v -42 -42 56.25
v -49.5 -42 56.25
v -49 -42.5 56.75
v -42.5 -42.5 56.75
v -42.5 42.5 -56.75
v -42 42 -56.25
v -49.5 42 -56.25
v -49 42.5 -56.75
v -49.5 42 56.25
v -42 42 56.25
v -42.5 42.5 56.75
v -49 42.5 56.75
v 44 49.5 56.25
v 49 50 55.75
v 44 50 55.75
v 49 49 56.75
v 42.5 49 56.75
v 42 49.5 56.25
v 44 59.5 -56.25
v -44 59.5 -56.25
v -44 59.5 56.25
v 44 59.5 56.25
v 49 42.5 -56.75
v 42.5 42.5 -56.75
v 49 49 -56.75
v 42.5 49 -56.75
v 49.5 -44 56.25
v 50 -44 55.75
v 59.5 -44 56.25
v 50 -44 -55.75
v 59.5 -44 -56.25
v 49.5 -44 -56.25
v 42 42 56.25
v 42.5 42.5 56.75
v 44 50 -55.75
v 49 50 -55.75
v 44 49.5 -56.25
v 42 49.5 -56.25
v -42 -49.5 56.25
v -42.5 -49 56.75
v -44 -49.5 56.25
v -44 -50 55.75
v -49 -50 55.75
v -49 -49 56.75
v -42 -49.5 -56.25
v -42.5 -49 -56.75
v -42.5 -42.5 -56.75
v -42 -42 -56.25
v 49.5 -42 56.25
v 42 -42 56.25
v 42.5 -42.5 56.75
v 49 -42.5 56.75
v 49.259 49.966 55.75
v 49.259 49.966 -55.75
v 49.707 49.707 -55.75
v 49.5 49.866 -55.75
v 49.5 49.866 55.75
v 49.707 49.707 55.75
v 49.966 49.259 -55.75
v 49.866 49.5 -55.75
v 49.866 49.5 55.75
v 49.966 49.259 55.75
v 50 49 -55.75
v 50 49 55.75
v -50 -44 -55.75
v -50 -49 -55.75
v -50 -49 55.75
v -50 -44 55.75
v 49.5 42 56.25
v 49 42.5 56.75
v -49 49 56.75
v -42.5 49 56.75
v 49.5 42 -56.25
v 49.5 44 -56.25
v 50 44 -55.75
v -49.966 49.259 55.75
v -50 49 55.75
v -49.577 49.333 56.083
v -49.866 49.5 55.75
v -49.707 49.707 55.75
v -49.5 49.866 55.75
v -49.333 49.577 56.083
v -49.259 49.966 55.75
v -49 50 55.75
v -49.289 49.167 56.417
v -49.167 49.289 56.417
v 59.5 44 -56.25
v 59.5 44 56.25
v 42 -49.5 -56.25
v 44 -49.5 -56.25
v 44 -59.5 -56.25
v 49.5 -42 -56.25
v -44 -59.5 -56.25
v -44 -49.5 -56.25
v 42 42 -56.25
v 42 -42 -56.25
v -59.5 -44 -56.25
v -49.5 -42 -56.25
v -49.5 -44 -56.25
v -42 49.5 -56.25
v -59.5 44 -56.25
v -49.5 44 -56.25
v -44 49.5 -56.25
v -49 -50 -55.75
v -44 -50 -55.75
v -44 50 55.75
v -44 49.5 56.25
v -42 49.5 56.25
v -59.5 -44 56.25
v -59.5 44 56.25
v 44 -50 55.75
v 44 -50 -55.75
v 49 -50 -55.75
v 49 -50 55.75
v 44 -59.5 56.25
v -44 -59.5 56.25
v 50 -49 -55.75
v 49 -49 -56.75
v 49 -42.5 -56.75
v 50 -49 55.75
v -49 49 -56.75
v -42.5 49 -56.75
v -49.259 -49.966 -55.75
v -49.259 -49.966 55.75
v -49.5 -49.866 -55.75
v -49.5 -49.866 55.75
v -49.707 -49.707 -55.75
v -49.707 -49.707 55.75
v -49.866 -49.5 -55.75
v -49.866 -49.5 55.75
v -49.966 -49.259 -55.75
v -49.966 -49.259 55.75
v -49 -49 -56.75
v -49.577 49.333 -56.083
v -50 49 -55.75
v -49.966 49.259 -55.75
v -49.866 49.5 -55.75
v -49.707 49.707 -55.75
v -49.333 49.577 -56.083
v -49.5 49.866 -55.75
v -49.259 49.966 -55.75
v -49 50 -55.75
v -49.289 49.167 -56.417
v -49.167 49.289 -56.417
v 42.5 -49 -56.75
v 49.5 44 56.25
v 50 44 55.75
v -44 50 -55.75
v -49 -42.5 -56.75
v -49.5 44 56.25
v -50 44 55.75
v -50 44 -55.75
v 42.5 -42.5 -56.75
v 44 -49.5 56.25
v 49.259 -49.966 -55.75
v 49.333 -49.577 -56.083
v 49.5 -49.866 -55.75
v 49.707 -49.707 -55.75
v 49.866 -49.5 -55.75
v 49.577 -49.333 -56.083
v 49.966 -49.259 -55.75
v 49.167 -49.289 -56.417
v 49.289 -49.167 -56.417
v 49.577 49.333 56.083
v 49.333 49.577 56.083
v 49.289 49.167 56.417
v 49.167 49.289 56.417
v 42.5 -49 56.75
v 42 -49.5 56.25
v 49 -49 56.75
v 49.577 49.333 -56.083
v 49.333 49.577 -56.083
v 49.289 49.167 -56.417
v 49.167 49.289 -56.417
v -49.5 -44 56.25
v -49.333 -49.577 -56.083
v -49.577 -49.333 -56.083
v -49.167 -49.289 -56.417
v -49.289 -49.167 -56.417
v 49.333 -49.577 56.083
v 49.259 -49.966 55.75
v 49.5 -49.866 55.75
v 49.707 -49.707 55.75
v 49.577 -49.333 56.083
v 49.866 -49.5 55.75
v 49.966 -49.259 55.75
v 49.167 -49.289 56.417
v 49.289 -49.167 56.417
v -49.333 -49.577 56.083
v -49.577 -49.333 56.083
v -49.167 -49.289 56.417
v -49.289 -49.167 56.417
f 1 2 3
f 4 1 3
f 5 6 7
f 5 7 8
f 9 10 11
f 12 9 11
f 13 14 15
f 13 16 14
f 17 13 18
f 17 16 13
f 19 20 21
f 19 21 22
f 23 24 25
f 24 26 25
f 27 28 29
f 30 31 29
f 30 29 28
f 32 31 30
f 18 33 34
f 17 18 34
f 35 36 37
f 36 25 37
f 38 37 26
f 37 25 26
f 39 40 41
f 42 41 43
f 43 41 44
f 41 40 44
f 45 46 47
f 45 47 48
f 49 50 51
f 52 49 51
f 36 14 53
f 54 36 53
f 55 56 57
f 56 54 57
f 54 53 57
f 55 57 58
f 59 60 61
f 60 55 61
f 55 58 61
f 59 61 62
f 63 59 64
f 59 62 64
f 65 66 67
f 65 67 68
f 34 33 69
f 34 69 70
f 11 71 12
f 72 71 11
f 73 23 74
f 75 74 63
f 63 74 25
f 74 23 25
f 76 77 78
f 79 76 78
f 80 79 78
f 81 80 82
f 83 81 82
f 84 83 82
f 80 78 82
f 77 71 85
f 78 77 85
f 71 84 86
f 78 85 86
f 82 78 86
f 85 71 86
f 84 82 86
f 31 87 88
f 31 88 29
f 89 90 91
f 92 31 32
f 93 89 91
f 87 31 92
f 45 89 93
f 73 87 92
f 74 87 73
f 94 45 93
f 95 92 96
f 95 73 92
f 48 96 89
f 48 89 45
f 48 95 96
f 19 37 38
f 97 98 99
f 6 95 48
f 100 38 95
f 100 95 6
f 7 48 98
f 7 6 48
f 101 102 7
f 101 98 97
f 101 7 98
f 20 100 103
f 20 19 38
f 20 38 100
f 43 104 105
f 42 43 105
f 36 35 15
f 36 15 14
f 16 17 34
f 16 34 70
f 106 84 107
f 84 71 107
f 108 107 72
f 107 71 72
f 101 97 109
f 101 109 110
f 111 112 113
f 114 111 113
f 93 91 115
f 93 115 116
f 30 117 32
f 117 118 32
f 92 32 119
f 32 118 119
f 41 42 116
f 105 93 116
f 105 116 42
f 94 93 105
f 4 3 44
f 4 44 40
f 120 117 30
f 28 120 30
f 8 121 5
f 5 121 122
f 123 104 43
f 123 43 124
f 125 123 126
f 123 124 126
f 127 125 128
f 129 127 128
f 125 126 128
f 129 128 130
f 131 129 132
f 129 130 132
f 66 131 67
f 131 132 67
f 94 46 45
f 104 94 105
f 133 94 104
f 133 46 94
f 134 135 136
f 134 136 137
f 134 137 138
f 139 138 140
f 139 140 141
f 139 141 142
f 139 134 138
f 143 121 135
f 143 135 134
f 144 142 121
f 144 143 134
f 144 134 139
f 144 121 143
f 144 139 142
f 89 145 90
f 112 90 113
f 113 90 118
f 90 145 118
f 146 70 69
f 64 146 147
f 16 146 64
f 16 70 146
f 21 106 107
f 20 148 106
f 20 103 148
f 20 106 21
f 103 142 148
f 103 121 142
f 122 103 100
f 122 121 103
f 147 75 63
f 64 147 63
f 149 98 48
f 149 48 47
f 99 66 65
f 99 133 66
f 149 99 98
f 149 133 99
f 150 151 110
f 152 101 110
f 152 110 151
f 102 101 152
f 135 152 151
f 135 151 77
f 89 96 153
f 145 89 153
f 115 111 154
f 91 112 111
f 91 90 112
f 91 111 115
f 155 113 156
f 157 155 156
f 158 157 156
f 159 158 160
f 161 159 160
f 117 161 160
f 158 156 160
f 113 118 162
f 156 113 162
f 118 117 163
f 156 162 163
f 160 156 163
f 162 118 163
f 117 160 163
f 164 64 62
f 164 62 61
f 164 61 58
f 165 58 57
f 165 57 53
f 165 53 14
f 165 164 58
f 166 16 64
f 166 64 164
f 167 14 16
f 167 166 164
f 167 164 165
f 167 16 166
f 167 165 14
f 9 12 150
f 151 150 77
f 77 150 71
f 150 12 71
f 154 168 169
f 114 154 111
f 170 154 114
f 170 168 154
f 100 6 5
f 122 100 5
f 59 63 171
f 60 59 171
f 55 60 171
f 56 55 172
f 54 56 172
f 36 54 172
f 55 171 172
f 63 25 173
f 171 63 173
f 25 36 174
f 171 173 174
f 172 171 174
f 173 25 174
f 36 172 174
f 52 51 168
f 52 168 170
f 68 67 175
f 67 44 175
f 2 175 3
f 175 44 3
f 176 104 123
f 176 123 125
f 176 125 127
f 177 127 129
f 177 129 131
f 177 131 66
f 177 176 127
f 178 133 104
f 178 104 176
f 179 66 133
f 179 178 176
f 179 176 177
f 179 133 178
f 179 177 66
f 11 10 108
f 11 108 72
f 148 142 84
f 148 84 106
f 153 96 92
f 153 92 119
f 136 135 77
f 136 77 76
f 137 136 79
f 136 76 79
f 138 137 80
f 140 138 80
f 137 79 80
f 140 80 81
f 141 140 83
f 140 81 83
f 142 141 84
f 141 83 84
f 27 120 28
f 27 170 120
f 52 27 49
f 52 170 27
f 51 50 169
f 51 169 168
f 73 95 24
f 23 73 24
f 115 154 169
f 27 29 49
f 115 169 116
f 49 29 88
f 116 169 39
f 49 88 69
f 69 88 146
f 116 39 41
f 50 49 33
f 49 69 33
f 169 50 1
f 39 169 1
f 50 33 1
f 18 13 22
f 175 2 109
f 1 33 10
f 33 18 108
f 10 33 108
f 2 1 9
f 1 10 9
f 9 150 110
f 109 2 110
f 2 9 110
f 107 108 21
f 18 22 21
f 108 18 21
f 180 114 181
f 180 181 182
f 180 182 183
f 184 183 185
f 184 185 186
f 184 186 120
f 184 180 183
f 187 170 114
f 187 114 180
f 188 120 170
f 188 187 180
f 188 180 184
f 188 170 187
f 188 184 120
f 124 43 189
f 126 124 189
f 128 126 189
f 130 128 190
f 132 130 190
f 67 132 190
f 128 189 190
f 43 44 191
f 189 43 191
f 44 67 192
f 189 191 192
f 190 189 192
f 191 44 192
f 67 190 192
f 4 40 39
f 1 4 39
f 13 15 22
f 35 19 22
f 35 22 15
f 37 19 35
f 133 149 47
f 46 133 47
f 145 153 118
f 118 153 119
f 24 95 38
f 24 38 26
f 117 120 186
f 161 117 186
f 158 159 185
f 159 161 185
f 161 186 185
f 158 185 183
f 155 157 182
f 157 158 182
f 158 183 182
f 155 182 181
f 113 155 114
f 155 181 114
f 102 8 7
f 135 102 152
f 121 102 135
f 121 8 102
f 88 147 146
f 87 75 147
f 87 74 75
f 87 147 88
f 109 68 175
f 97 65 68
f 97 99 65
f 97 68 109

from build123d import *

# Parameters (mm, degrees)
BOSS_EXTRUDE1_DEPTH        = 56.75
BOSS_EXTRUDE1_DEPTH_BACK   = 56.75
SKETCH1_W                  = 8.5
SKETCH1_H                  = 8.5
BOSS_EXTRUDE1_2_DEPTH      = 56.75
BOSS_EXTRUDE1_2_DEPTH_BACK = 56.75
BOSS_EXTRUDE1_3_DEPTH      = 56.75
BOSS_EXTRUDE1_3_DEPTH_BACK = 56.75
BOSS_EXTRUDE1_4_DEPTH      = 56.75
BOSS_EXTRUDE1_4_DEPTH_BACK = 56.75
BOSS_EXTRUDE2_DEPTH        = 56.25
BOSS_EXTRUDE2_DEPTH_BACK   = 56.25
FILLET1_R                  = 1
CHAMFER2_SIZE              = 1


with BuildPart() as part:
    # Sketch1 → Boss-Extrude1 (new, two sides: drawn at the far end of the back side and taken through both)
    with BuildSketch(Plane.XY.offset(-BOSS_EXTRUDE1_DEPTH_BACK)):
        with Locations((-45.75, 45.75)):
            Rectangle(SKETCH1_W, SKETCH1_H)
    extrude(amount=BOSS_EXTRUDE1_DEPTH + BOSS_EXTRUDE1_DEPTH_BACK)



with BuildPart() as body_2:
    # Sketch1 → Boss-Extrude1 2 (new, two sides: drawn at the far end of the back side and taken through both)
    with BuildSketch(Plane.XY.offset(-BOSS_EXTRUDE1_2_DEPTH_BACK)):
        with Locations((45.75, 45.75)):
            Rectangle(SKETCH1_W, SKETCH1_H)
    extrude(amount=BOSS_EXTRUDE1_2_DEPTH + BOSS_EXTRUDE1_2_DEPTH_BACK)


with BuildPart() as body_3:
    # Sketch1 → Boss-Extrude1 3 (new, two sides: drawn at the far end of the back side and taken through both)
    with BuildSketch(Plane.XY.offset(-BOSS_EXTRUDE1_3_DEPTH_BACK)):
        with Locations((45.75, -45.75)):
            Rectangle(SKETCH1_W, SKETCH1_H)
    extrude(amount=BOSS_EXTRUDE1_3_DEPTH + BOSS_EXTRUDE1_3_DEPTH_BACK)


with BuildPart() as body_4:
    # Sketch1 → Boss-Extrude1 4 (new, two sides: drawn at the far end of the back side and taken through both)
    with BuildSketch(Plane.XY.offset(-BOSS_EXTRUDE1_4_DEPTH_BACK)):
        with Locations((-45.75, -45.75)):
            Rectangle(SKETCH1_W, SKETCH1_H)
    extrude(amount=BOSS_EXTRUDE1_4_DEPTH + BOSS_EXTRUDE1_4_DEPTH_BACK)


with BuildPart() as part_1:
    add(part.part)

    add(body_2.part)  # Boss-Extrude2 merges body 2

    add(body_3.part)  # Boss-Extrude2 merges body 3

    add(body_4.part)  # Boss-Extrude2 merges body 4
    # Sketch2 → Boss-Extrude2 (add, two sides: drawn at the far end of the back side and taken through both)
    with BuildSketch(Plane.XY.offset(-BOSS_EXTRUDE2_DEPTH_BACK)):
        Polygon((-44, 50), (-44, 59.5), (44, 59.5), (44, 50), (50, 50), (50, 44), (59.5, 44), (59.5, -44), (50, -44), (50, -50), (44, -50), (44, -59.5), (-44, -59.5), (-44, -50), (-50, -50), (-50, -44), (-59.5, -44), (-59.5, 44), (-50, 44), (-50, 50), align=None)
    extrude(amount=BOSS_EXTRUDE2_DEPTH + BOSS_EXTRUDE2_DEPTH_BACK)

    # Fillet1
    fillet1_edges = [part_1.edges().sort_by_distance(p)[0] for p in [
        (50, -50, 0),
        (-50, -50, 0),
        (-50, 50, 0),
        (50, 50, 0),
    ]]
    fillet(fillet1_edges, radius=FILLET1_R)

    # Chamfer2
    chamfer2_edges = [part_1.edges().sort_by_distance(p)[0] for p in [
        (45.25, -50, 56.75),
        (50, -45.25, 56.75),
        (49.707106781, -49.707106781, 56.75),
    ]]
    chamfer(chamfer2_edges, length=CHAMFER2_SIZE)
    chamfer2_2_edges = [part_1.edges().sort_by_distance(p)[0] for p in [
        (45.25, -50, -56.75),
        (50, -45.25, -56.75),
        (49.707106781, -49.707106781, -56.75),
    ]]
    chamfer(chamfer2_2_edges, length=CHAMFER2_SIZE)
    chamfer2_3_edges = [part_1.edges().sort_by_distance(p)[0] for p in [
        (50, 45.25, 56.75),
        (45.25, 50, 56.75),
        (49.707106781, 49.707106781, 56.75),
    ]]
    chamfer(chamfer2_3_edges, length=CHAMFER2_SIZE)
    chamfer2_4_edges = [part_1.edges().sort_by_distance(p)[0] for p in [
        (50, 45.25, -56.75),
        (45.25, 50, -56.75),
        (49.707106781, 49.707106781, -56.75),
    ]]
    chamfer(chamfer2_4_edges, length=CHAMFER2_SIZE)
    chamfer2_5_edges = [part_1.edges().sort_by_distance(p)[0] for p in [
        (-45.25, 50, 56.75),
        (-49.707106781, 49.707106781, 56.75),
        (-50, 45.25, 56.75),
    ]]
    chamfer(chamfer2_5_edges, length=CHAMFER2_SIZE)
    chamfer2_6_edges = [part_1.edges().sort_by_distance(p)[0] for p in [
        (-45.25, 50, -56.75),
        (-49.707106781, 49.707106781, -56.75),
        (-50, 45.25, -56.75),
    ]]
    chamfer(chamfer2_6_edges, length=CHAMFER2_SIZE)
    chamfer2_7_edges = [part_1.edges().sort_by_distance(p)[0] for p in [
        (-50, -45.25, 56.75),
        (-45.25, -50, 56.75),
        (-49.707106781, -49.707106781, 56.75),
    ]]
    chamfer(chamfer2_7_edges, length=CHAMFER2_SIZE)
    chamfer2_8_edges = [part_1.edges().sort_by_distance(p)[0] for p in [
        (-50, -45.25, -56.75),
        (-45.25, -50, -56.75),
        (-49.707106781, -49.707106781, -56.75),
    ]]
    chamfer(chamfer2_8_edges, length=CHAMFER2_SIZE)
    # the kernel refuses this chamfer: 1 mm, written as the material it takes off along each edge
    with BuildSketch(Plane(origin=(41.5, -51.571682988, 56.75), x_dir=(-0.027495876610589005, 0, -0.9996219169112968), z_dir=(0, 1, 0))) as chamfer2_9_piece_1_section:
        with BuildLine():
            Line((1.028673195, 0), (-0.056547155, -1.027117794))
            Line((-0.056547155, -1.027117794), (-0.076539593, -1.026567876))
            ThreePointArc((-0.076539593, -1.026567876), (-0.034129227, -0.51339783), (-0.019992438, 0.000549918))
            Line((-0.019992438, 0.000549918), (0.000549918, 0.019992438))
            ThreePointArc((0.000549918, 0.019992438), (0.514497665, 0.00585565), (1.029223113, 0.019992438))
            Line((1.029223113, 0.019992438), (1.028673195, 0))
        make_face()
    chamfer2_9_piece_1 = extrude(amount=12.643365976, mode=Mode.PRIVATE)
    chamfer2_9_piece_1 = split(chamfer2_9_piece_1, bisect_by=Plane(origin=(41.893401084, -45.25, 56.25), z_dir=(0, 0, 1)), keep=Keep.TOP, mode=Mode.PRIVATE)
    add(chamfer2_9_piece_1, mode=Mode.SUBTRACT)
    # the kernel refuses this chamfer: 1 mm, written as the material it takes off along each edge
    with BuildSketch(Plane(origin=(41.5, -51.571682988, -56.75), x_dir=(-0.027495876610589005, 0, 0.9996219169112968), z_dir=(0, 1, 0))) as chamfer2_10_piece_1_section:
        with BuildLine():
            Line((1.028673195, 0), (-0.056547155, 1.027117794))
            Line((-0.056547155, 1.027117794), (-0.076539593, 1.026567876))
            ThreePointArc((-0.076539593, 1.026567876), (-0.034129227, 0.51339783), (-0.019992438, -0.000549918))
            Line((-0.019992438, -0.000549918), (0.000549918, -0.019992438))
            ThreePointArc((0.000549918, -0.019992438), (0.514497665, -0.00585565), (1.029223113, -0.019992438))
            Line((1.029223113, -0.019992438), (1.028673195, 0))
        make_face()
    chamfer2_10_piece_1 = extrude(amount=12.643365976, mode=Mode.PRIVATE)
    chamfer2_10_piece_1 = split(chamfer2_10_piece_1, bisect_by=Plane(origin=(41.893401084, -45.25, -56.25), z_dir=(0, 0, -1)), keep=Keep.TOP, mode=Mode.PRIVATE)
    add(chamfer2_10_piece_1, mode=Mode.SUBTRACT)
    # the kernel refuses this chamfer: 1 mm, written as the material it takes off along each edge
    with BuildSketch(Plane(origin=(39.928317012, -41.5, 56.75), x_dir=(0, 0.027495876610589005, -0.9996219169112968), z_dir=(1, 0, 0))) as chamfer2_11_piece_1_section:
        with BuildLine():
            Line((1.028673195, 0), (-0.056547155, -1.027117794))
            Line((-0.056547155, -1.027117794), (-0.076539593, -1.026567876))
            ThreePointArc((-0.076539593, -1.026567876), (-0.034129227, -0.51339783), (-0.019992438, 0.000549918))
            Line((-0.019992438, 0.000549918), (0.000549918, 0.019992438))
            ThreePointArc((0.000549918, 0.019992438), (0.514497665, 0.00585565), (1.029223113, 0.019992438))
            Line((1.029223113, 0.019992438), (1.028673195, 0))
        make_face()
    chamfer2_11_piece_1 = extrude(amount=11.643365976, mode=Mode.PRIVATE)
    chamfer2_11_piece_1 = split(chamfer2_11_piece_1, bisect_by=Plane(origin=(45.75, -41.893401084, 56.25), z_dir=(0, 0, 1)), keep=Keep.TOP, mode=Mode.PRIVATE)
    add(chamfer2_11_piece_1, mode=Mode.SUBTRACT)
    # the kernel refuses this chamfer: 1 mm, written as the material it takes off along each edge
    with BuildSketch(Plane(origin=(39.928317012, -41.5, -56.75), x_dir=(0, 0.027495876610589005, 0.9996219169112968), z_dir=(1, 0, 0))) as chamfer2_12_piece_1_section:
        with BuildLine():
            Line((1.028673195, 0), (-0.056547155, 1.027117794))
            Line((-0.056547155, 1.027117794), (-0.076539593, 1.026567876))
            ThreePointArc((-0.076539593, 1.026567876), (-0.034129227, 0.51339783), (-0.019992438, -0.000549918))
            Line((-0.019992438, -0.000549918), (0.000549918, -0.019992438))
            ThreePointArc((0.000549918, -0.019992438), (0.514497665, -0.00585565), (1.029223113, -0.019992438))
            Line((1.029223113, -0.019992438), (1.028673195, 0))
        make_face()
    chamfer2_12_piece_1 = extrude(amount=11.643365976, mode=Mode.PRIVATE)
    chamfer2_12_piece_1 = split(chamfer2_12_piece_1, bisect_by=Plane(origin=(45.75, -41.893401084, -56.25), z_dir=(0, 0, -1)), keep=Keep.TOP, mode=Mode.PRIVATE)
    add(chamfer2_12_piece_1, mode=Mode.SUBTRACT)
    # the kernel refuses this chamfer: 1 mm, written as the material it takes off along each edge
    with BuildSketch(Plane(origin=(38.928317012, 41.5, 56.75), x_dir=(0, -0.027495876610589005, -0.9996219169112968), z_dir=(1, 0, 0))) as chamfer2_13_piece_1_section:
        with BuildLine():
            Line((1.028673195, 0), (-0.056547155, 1.027117794))
            Line((-0.056547155, 1.027117794), (-0.076539593, 1.026567876))
            ThreePointArc((-0.076539593, 1.026567876), (-0.034129227, 0.51339783), (-0.019992438, -0.000549918))
            Line((-0.019992438, -0.000549918), (0.000549918, -0.019992438))
            ThreePointArc((0.000549918, -0.019992438), (0.514497665, -0.00585565), (1.029223113, -0.019992438))
            Line((1.029223113, -0.019992438), (1.028673195, 0))
        make_face()
    chamfer2_13_piece_1 = extrude(amount=12.643365976, mode=Mode.PRIVATE)
    chamfer2_13_piece_1 = split(chamfer2_13_piece_1, bisect_by=Plane(origin=(45.25, 41.893401084, 56.25), z_dir=(0, 0, 1)), keep=Keep.TOP, mode=Mode.PRIVATE)
    add(chamfer2_13_piece_1, mode=Mode.SUBTRACT)
    # the kernel refuses this chamfer: 1 mm, written as the material it takes off along each edge
    with BuildSketch(Plane(origin=(41.5, 51.571682988, 56.75), x_dir=(-0.027495876610589005, 0, -0.9996219169112968), z_dir=(0, -1, 0))) as chamfer2_14_piece_1_section:
        with BuildLine():
            Line((1.028673195, 0), (-0.056547155, 1.027117794))
            Line((-0.056547155, 1.027117794), (-0.076539593, 1.026567876))
            ThreePointArc((-0.076539593, 1.026567876), (-0.034129227, 0.51339783), (-0.019992438, -0.000549918))
            Line((-0.019992438, -0.000549918), (0.000549918, -0.019992438))
            ThreePointArc((0.000549918, -0.019992438), (0.514497665, -0.00585565), (1.029223113, -0.019992438))
            Line((1.029223113, -0.019992438), (1.028673195, 0))
        make_face()
    chamfer2_14_piece_1 = extrude(amount=11.643365976, mode=Mode.PRIVATE)
    chamfer2_14_piece_1 = split(chamfer2_14_piece_1, bisect_by=Plane(origin=(41.893401084, 45.75, 56.25), z_dir=(0, 0, 1)), keep=Keep.TOP, mode=Mode.PRIVATE)
    add(chamfer2_14_piece_1, mode=Mode.SUBTRACT)
    # the kernel refuses this chamfer: 1 mm, written as the material it takes off along each edge
    with BuildSketch(Plane(origin=(38.928317012, 41.5, -56.75), x_dir=(0, -0.027495876610589005, 0.9996219169112968), z_dir=(1, 0, 0))) as chamfer2_15_piece_1_section:
        with BuildLine():
            Line((1.028673195, 0), (-0.056547155, -1.027117794))
            Line((-0.056547155, -1.027117794), (-0.076539593, -1.026567876))
            ThreePointArc((-0.076539593, -1.026567876), (-0.034129227, -0.51339783), (-0.019992438, 0.000549918))
            Line((-0.019992438, 0.000549918), (0.000549918, 0.019992438))
            ThreePointArc((0.000549918, 0.019992438), (0.514497665, 0.00585565), (1.029223113, 0.019992438))
            Line((1.029223113, 0.019992438), (1.028673195, 0))
        make_face()
    chamfer2_15_piece_1 = extrude(amount=12.643365976, mode=Mode.PRIVATE)
    chamfer2_15_piece_1 = split(chamfer2_15_piece_1, bisect_by=Plane(origin=(45.25, 41.893401084, -56.25), z_dir=(0, 0, -1)), keep=Keep.TOP, mode=Mode.PRIVATE)
    add(chamfer2_15_piece_1, mode=Mode.SUBTRACT)
    # the kernel refuses this chamfer: 1 mm, written as the material it takes off along each edge
    with BuildSketch(Plane(origin=(41.5, 51.571682988, -56.75), x_dir=(-0.027495876610589005, 0, 0.9996219169112968), z_dir=(0, -1, 0))) as chamfer2_16_piece_1_section:
        with BuildLine():
            Line((1.028673195, 0), (-0.056547155, -1.027117794))
            Line((-0.056547155, -1.027117794), (-0.076539593, -1.026567876))
            ThreePointArc((-0.076539593, -1.026567876), (-0.034129227, -0.51339783), (-0.019992438, 0.000549918))
            Line((-0.019992438, 0.000549918), (0.000549918, 0.019992438))
            ThreePointArc((0.000549918, 0.019992438), (0.514497665, 0.00585565), (1.029223113, 0.019992438))
            Line((1.029223113, 0.019992438), (1.028673195, 0))
        make_face()
    chamfer2_16_piece_1 = extrude(amount=11.643365976, mode=Mode.PRIVATE)
    chamfer2_16_piece_1 = split(chamfer2_16_piece_1, bisect_by=Plane(origin=(41.893401084, 45.75, -56.25), z_dir=(0, 0, -1)), keep=Keep.TOP, mode=Mode.PRIVATE)
    add(chamfer2_16_piece_1, mode=Mode.SUBTRACT)
    # the kernel refuses this chamfer: 1 mm, written as the material it takes off along each edge
    with BuildSketch(Plane(origin=(-41.5, 51.571682988, 56.75), x_dir=(0.027495876610589005, 0, -0.9996219169112968), z_dir=(0, -1, 0))) as chamfer2_17_piece_1_section:
        with BuildLine():
            Line((1.028673195, 0), (-0.056547155, -1.027117794))
            Line((-0.056547155, -1.027117794), (-0.076539593, -1.026567876))
            ThreePointArc((-0.076539593, -1.026567876), (-0.034129227, -0.51339783), (-0.019992438, 0.000549918))
            Line((-0.019992438, 0.000549918), (0.000549918, 0.019992438))
            ThreePointArc((0.000549918, 0.019992438), (0.514497665, 0.00585565), (1.029223113, 0.019992438))
            Line((1.029223113, 0.019992438), (1.028673195, 0))
        make_face()
    chamfer2_17_piece_1 = extrude(amount=12.643365976, mode=Mode.PRIVATE)
    chamfer2_17_piece_1 = split(chamfer2_17_piece_1, bisect_by=Plane(origin=(-41.893401084, 45.25, 56.25), z_dir=(0, 0, 1)), keep=Keep.TOP, mode=Mode.PRIVATE)
    add(chamfer2_17_piece_1, mode=Mode.SUBTRACT)
    # the kernel refuses this chamfer: 1 mm, written as the material it takes off along each edge
    with BuildSketch(Plane(origin=(-39.928317012, 41.5, 56.75), x_dir=(0, -0.027495876610589005, -0.9996219169112968), z_dir=(-1, 0, 0))) as chamfer2_18_piece_1_section:
        with BuildLine():
            Line((1.028673195, 0), (-0.056547155, -1.027117794))
            Line((-0.056547155, -1.027117794), (-0.076539593, -1.026567876))
            ThreePointArc((-0.076539593, -1.026567876), (-0.034129227, -0.51339783), (-0.019992438, 0.000549918))
            Line((-0.019992438, 0.000549918), (0.000549918, 0.019992438))
            ThreePointArc((0.000549918, 0.019992438), (0.514497665, 0.00585565), (1.029223113, 0.019992438))
            Line((1.029223113, 0.019992438), (1.028673195, 0))
        make_face()
    chamfer2_18_piece_1 = extrude(amount=11.643365976, mode=Mode.PRIVATE)
    chamfer2_18_piece_1 = split(chamfer2_18_piece_1, bisect_by=Plane(origin=(-45.75, 41.893401084, 56.25), z_dir=(0, 0, 1)), keep=Keep.TOP, mode=Mode.PRIVATE)
    add(chamfer2_18_piece_1, mode=Mode.SUBTRACT)
    # the kernel refuses this chamfer: 1 mm, written as the material it takes off along each edge
    with BuildSketch(Plane(origin=(-41.5, 51.571682988, -56.75), x_dir=(0.027495876610589005, 0, 0.9996219169112968), z_dir=(0, -1, 0))) as chamfer2_19_piece_1_section:
        with BuildLine():
            Line((1.028673195, 0), (-0.056547155, 1.027117794))
            Line((-0.056547155, 1.027117794), (-0.076539593, 1.026567876))
            ThreePointArc((-0.076539593, 1.026567876), (-0.034129227, 0.51339783), (-0.019992438, -0.000549918))
            Line((-0.019992438, -0.000549918), (0.000549918, -0.019992438))
            ThreePointArc((0.000549918, -0.019992438), (0.514497665, -0.00585565), (1.029223113, -0.019992438))
            Line((1.029223113, -0.019992438), (1.028673195, 0))
        make_face()
    chamfer2_19_piece_1 = extrude(amount=12.643365976, mode=Mode.PRIVATE)
    chamfer2_19_piece_1 = split(chamfer2_19_piece_1, bisect_by=Plane(origin=(-41.893401084, 45.25, -56.25), z_dir=(0, 0, -1)), keep=Keep.TOP, mode=Mode.PRIVATE)
    add(chamfer2_19_piece_1, mode=Mode.SUBTRACT)
    # the kernel refuses this chamfer: 1 mm, written as the material it takes off along each edge
    with BuildSketch(Plane(origin=(-39.928317012, 41.5, -56.75), x_dir=(0, -0.027495876610589005, 0.9996219169112968), z_dir=(-1, 0, 0))) as chamfer2_20_piece_1_section:
        with BuildLine():
            Line((1.028673195, 0), (-0.056547155, 1.027117794))
            Line((-0.056547155, 1.027117794), (-0.076539593, 1.026567876))
            ThreePointArc((-0.076539593, 1.026567876), (-0.034129227, 0.51339783), (-0.019992438, -0.000549918))
            Line((-0.019992438, -0.000549918), (0.000549918, -0.019992438))
            ThreePointArc((0.000549918, -0.019992438), (0.514497665, -0.00585565), (1.029223113, -0.019992438))
            Line((1.029223113, -0.019992438), (1.028673195, 0))
        make_face()
    chamfer2_20_piece_1 = extrude(amount=11.643365976, mode=Mode.PRIVATE)
    chamfer2_20_piece_1 = split(chamfer2_20_piece_1, bisect_by=Plane(origin=(-45.75, 41.893401084, -56.25), z_dir=(0, 0, -1)), keep=Keep.TOP, mode=Mode.PRIVATE)
    add(chamfer2_20_piece_1, mode=Mode.SUBTRACT)
    # the kernel refuses this chamfer: 1 mm, written as the material it takes off along each edge
    with BuildSketch(Plane(origin=(-38.928317012, -41.5, 56.75), x_dir=(0, 0.027495876610589005, -0.9996219169112968), z_dir=(-1, 0, 0))) as chamfer2_21_piece_1_section:
        with BuildLine():
            Line((1.028673195, 0), (-0.056547155, 1.027117794))
            Line((-0.056547155, 1.027117794), (-0.076539593, 1.026567876))
            ThreePointArc((-0.076539593, 1.026567876), (-0.034129227, 0.51339783), (-0.019992438, -0.000549918))
            Line((-0.019992438, -0.000549918), (0.000549918, -0.019992438))
            ThreePointArc((0.000549918, -0.019992438), (0.514497665, -0.00585565), (1.029223113, -0.019992438))
            Line((1.029223113, -0.019992438), (1.028673195, 0))
        make_face()
    chamfer2_21_piece_1 = extrude(amount=12.643365976, mode=Mode.PRIVATE)
    chamfer2_21_piece_1 = split(chamfer2_21_piece_1, bisect_by=Plane(origin=(-45.25, -41.893401084, 56.25), z_dir=(0, 0, 1)), keep=Keep.TOP, mode=Mode.PRIVATE)
    add(chamfer2_21_piece_1, mode=Mode.SUBTRACT)
    # the kernel refuses this chamfer: 1 mm, written as the material it takes off along each edge
    with BuildSketch(Plane(origin=(-41.5, -51.571682988, 56.75), x_dir=(-0.9996219169112968, 0, 0.027495876610589005), z_dir=(0, 1, 0))) as chamfer2_22_piece_1_section:
        with BuildLine():
            Line((1.028673195, 0), (-0.056547155, -1.027117794))
            Line((-0.056547155, -1.027117794), (-0.076539593, -1.026567876))
            ThreePointArc((-0.076539593, -1.026567876), (-0.034129227, -0.51339783), (-0.019992438, 0.000549918))
            Line((-0.019992438, 0.000549918), (0.000549918, 0.019992438))
            ThreePointArc((0.000549918, 0.019992438), (0.514497665, 0.00585565), (1.029223113, 0.019992438))
            Line((1.029223113, 0.019992438), (1.028673195, 0))
        make_face()
    chamfer2_22_piece_1 = extrude(amount=11.643365976, mode=Mode.PRIVATE)
    chamfer2_22_piece_1 = split(chamfer2_22_piece_1, bisect_by=Plane(origin=(-41.893401084, -45.75, 56.25), z_dir=(0, 0, 1)), keep=Keep.TOP, mode=Mode.PRIVATE)
    add(chamfer2_22_piece_1, mode=Mode.SUBTRACT)
    # the kernel refuses this chamfer: 1 mm, written as the material it takes off along each edge
    with BuildSketch(Plane(origin=(-38.928317012, -41.5, -56.75), x_dir=(0, 0.027495876610589005, 0.9996219169112968), z_dir=(-1, 0, 0))) as chamfer2_23_piece_1_section:
        with BuildLine():
            Line((1.028673195, 0), (-0.056547155, -1.027117794))
            Line((-0.056547155, -1.027117794), (-0.076539593, -1.026567876))
            ThreePointArc((-0.076539593, -1.026567876), (-0.034129227, -0.51339783), (-0.019992438, 0.000549918))
            Line((-0.019992438, 0.000549918), (0.000549918, 0.019992438))
            ThreePointArc((0.000549918, 0.019992438), (0.514497665, 0.00585565), (1.029223113, 0.019992438))
            Line((1.029223113, 0.019992438), (1.028673195, 0))
        make_face()
    chamfer2_23_piece_1 = extrude(amount=12.643365976, mode=Mode.PRIVATE)
    chamfer2_23_piece_1 = split(chamfer2_23_piece_1, bisect_by=Plane(origin=(-45.25, -41.893401084, -56.25), z_dir=(0, 0, -1)), keep=Keep.TOP, mode=Mode.PRIVATE)
    add(chamfer2_23_piece_1, mode=Mode.SUBTRACT)
    # the kernel refuses this chamfer: 1 mm, written as the material it takes off along each edge
    with BuildSketch(Plane(origin=(-41.5, -51.571682988, -56.75), x_dir=(-0.9996219169112968, 0, -0.027495876610589005), z_dir=(0, 1, 0))) as chamfer2_24_piece_1_section:
        with BuildLine():
            Line((1.028673195, 0), (-0.056547155, 1.027117794))
            Line((-0.056547155, 1.027117794), (-0.076539593, 1.026567876))
            ThreePointArc((-0.076539593, 1.026567876), (-0.034129227, 0.51339783), (-0.019992438, -0.000549918))
            Line((-0.019992438, -0.000549918), (0.000549918, -0.019992438))
            ThreePointArc((0.000549918, -0.019992438), (0.514497665, -0.00585565), (1.029223113, -0.019992438))
            Line((1.029223113, -0.019992438), (1.028673195, 0))
        make_face()
    chamfer2_24_piece_1 = extrude(amount=11.643365976, mode=Mode.PRIVATE)
    chamfer2_24_piece_1 = split(chamfer2_24_piece_1, bisect_by=Plane(origin=(-41.893401084, -45.75, -56.25), z_dir=(0, 0, -1)), keep=Keep.TOP, mode=Mode.PRIVATE)
    add(chamfer2_24_piece_1, mode=Mode.SUBTRACT)


solid = part_1.part
